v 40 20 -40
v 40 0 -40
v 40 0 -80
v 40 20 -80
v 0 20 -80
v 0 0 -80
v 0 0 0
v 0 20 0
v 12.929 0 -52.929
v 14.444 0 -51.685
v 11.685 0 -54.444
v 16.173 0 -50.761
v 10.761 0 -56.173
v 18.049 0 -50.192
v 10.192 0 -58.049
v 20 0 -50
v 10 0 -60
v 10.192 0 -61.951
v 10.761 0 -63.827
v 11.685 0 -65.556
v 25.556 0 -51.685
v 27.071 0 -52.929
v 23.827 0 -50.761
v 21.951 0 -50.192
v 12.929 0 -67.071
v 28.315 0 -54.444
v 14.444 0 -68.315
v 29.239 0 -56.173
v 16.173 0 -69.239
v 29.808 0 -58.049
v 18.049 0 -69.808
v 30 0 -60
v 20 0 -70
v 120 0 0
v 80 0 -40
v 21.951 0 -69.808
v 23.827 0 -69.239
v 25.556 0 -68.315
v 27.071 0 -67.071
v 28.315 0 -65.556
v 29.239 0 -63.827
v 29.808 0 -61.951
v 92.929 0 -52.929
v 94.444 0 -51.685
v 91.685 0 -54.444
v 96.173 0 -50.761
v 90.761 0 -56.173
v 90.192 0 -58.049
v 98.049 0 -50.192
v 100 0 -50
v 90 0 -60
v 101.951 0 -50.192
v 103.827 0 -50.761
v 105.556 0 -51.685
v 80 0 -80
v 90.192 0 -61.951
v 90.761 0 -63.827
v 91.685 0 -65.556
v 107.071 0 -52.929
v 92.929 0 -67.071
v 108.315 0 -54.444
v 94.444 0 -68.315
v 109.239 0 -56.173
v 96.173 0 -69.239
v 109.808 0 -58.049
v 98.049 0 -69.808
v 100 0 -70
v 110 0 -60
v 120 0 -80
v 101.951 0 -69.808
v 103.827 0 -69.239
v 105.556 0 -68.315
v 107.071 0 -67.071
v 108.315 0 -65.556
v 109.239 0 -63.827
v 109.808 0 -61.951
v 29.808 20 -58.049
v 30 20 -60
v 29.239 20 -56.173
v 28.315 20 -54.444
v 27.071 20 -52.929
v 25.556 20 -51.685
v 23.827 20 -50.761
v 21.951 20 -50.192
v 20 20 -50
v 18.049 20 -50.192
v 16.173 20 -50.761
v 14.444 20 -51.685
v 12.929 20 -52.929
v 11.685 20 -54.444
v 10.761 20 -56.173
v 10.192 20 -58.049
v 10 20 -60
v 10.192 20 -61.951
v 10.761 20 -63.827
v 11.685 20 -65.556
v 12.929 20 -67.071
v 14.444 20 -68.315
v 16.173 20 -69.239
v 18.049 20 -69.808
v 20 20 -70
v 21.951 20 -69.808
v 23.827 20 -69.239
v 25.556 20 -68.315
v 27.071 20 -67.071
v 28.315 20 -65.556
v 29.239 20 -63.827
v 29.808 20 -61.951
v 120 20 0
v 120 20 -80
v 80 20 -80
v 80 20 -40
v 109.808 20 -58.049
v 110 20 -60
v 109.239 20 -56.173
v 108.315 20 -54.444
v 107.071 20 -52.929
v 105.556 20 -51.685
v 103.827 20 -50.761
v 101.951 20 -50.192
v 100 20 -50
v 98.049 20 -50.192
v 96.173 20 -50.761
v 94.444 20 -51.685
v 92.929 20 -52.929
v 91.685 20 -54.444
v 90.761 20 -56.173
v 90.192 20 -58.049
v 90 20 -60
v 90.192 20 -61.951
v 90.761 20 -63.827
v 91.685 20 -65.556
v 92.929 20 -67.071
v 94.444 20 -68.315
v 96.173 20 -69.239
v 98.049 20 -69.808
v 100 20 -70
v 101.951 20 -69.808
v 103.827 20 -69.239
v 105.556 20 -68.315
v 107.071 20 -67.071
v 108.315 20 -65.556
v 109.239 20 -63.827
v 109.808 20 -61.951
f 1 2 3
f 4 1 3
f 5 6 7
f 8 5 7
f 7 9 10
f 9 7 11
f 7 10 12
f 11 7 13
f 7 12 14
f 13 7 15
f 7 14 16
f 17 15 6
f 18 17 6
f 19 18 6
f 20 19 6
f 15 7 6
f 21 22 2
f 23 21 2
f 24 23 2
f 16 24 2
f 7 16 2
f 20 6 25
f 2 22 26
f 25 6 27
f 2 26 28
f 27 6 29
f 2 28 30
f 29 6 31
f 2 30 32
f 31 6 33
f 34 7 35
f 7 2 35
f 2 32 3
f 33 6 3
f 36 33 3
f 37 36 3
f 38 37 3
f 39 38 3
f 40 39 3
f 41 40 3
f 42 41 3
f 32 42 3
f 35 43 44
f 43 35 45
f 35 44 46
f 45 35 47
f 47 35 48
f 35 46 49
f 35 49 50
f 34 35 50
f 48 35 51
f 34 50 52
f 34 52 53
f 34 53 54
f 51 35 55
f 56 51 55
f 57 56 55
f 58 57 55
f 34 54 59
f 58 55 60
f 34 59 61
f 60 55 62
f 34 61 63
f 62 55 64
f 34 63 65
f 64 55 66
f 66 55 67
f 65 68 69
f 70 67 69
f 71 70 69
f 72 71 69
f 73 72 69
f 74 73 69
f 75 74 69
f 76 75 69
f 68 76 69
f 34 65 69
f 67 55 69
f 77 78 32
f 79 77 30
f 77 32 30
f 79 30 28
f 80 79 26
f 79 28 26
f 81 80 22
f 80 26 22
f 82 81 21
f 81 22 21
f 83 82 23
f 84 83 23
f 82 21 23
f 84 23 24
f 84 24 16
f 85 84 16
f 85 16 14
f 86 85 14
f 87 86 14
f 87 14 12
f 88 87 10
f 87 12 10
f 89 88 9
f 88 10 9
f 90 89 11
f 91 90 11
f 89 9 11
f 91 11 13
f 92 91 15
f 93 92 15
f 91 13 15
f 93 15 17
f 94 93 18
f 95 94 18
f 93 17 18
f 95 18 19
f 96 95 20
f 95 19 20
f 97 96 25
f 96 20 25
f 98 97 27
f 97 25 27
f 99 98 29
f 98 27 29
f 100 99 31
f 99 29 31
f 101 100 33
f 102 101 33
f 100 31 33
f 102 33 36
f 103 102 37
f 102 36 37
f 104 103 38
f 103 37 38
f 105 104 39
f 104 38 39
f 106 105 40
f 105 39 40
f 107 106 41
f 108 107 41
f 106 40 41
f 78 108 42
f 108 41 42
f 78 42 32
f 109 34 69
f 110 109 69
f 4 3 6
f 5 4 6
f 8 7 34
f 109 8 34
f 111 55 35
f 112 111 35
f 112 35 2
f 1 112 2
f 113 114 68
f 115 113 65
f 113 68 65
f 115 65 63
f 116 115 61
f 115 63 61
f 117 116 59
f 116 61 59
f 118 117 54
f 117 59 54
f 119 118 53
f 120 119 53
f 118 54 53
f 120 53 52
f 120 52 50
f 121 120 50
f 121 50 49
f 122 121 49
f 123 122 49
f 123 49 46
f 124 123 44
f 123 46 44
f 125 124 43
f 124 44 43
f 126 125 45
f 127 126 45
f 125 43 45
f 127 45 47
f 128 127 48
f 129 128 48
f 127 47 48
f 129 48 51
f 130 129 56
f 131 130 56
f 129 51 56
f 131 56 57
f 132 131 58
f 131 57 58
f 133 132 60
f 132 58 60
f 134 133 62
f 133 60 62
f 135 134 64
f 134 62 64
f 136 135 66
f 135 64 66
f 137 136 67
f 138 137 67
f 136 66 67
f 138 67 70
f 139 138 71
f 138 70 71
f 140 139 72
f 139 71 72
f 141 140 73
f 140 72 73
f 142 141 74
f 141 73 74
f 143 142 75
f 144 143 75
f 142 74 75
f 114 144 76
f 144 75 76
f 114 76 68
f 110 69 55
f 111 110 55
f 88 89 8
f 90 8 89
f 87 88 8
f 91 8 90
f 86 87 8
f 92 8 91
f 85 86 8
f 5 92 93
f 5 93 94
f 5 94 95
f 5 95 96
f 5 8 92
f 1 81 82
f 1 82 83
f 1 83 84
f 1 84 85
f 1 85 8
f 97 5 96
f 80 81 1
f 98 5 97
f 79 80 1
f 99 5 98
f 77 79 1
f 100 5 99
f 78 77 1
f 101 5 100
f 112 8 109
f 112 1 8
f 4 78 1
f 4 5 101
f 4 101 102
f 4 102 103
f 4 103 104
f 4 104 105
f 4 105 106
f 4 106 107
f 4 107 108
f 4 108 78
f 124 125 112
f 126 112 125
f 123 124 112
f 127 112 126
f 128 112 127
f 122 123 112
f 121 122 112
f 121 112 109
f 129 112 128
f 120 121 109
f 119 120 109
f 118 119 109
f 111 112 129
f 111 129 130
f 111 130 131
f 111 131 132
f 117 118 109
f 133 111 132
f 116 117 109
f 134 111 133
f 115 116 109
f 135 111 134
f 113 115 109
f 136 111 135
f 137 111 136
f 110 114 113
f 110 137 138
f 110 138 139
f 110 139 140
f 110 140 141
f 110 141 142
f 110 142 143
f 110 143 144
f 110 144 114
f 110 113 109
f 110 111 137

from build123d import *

# Parameters (mm, degrees)
BOSS_EXTRUDE1_DEPTH = 20
SKETCH4_R           = 10
CUT_EXTRUDE1_DEPTH  = 20


with BuildPart() as part:
    # Sketch2 → Boss-Extrude1 (new body)
    with BuildSketch(Plane(origin=(0, 0, 0), x_dir=(1, 0, 0), z_dir=(0, 1, 0))):
        Polygon((0, 0), (120, 0), (120, 80), (80, 80), (80, 40), (40, 40), (40, 80), (0, 80), align=None)
    extrude(amount=BOSS_EXTRUDE1_DEPTH)

    # Sketch4 → Cut-Extrude1 (cut)
    with BuildSketch(Plane.XZ):
        with Locations((20, -60)):
            Circle(SKETCH4_R)
        with Locations((100, -60)):
            Circle(SKETCH4_R)
    extrude(amount=-CUT_EXTRUDE1_DEPTH, mode=Mode.SUBTRACT)


solid = part.part
